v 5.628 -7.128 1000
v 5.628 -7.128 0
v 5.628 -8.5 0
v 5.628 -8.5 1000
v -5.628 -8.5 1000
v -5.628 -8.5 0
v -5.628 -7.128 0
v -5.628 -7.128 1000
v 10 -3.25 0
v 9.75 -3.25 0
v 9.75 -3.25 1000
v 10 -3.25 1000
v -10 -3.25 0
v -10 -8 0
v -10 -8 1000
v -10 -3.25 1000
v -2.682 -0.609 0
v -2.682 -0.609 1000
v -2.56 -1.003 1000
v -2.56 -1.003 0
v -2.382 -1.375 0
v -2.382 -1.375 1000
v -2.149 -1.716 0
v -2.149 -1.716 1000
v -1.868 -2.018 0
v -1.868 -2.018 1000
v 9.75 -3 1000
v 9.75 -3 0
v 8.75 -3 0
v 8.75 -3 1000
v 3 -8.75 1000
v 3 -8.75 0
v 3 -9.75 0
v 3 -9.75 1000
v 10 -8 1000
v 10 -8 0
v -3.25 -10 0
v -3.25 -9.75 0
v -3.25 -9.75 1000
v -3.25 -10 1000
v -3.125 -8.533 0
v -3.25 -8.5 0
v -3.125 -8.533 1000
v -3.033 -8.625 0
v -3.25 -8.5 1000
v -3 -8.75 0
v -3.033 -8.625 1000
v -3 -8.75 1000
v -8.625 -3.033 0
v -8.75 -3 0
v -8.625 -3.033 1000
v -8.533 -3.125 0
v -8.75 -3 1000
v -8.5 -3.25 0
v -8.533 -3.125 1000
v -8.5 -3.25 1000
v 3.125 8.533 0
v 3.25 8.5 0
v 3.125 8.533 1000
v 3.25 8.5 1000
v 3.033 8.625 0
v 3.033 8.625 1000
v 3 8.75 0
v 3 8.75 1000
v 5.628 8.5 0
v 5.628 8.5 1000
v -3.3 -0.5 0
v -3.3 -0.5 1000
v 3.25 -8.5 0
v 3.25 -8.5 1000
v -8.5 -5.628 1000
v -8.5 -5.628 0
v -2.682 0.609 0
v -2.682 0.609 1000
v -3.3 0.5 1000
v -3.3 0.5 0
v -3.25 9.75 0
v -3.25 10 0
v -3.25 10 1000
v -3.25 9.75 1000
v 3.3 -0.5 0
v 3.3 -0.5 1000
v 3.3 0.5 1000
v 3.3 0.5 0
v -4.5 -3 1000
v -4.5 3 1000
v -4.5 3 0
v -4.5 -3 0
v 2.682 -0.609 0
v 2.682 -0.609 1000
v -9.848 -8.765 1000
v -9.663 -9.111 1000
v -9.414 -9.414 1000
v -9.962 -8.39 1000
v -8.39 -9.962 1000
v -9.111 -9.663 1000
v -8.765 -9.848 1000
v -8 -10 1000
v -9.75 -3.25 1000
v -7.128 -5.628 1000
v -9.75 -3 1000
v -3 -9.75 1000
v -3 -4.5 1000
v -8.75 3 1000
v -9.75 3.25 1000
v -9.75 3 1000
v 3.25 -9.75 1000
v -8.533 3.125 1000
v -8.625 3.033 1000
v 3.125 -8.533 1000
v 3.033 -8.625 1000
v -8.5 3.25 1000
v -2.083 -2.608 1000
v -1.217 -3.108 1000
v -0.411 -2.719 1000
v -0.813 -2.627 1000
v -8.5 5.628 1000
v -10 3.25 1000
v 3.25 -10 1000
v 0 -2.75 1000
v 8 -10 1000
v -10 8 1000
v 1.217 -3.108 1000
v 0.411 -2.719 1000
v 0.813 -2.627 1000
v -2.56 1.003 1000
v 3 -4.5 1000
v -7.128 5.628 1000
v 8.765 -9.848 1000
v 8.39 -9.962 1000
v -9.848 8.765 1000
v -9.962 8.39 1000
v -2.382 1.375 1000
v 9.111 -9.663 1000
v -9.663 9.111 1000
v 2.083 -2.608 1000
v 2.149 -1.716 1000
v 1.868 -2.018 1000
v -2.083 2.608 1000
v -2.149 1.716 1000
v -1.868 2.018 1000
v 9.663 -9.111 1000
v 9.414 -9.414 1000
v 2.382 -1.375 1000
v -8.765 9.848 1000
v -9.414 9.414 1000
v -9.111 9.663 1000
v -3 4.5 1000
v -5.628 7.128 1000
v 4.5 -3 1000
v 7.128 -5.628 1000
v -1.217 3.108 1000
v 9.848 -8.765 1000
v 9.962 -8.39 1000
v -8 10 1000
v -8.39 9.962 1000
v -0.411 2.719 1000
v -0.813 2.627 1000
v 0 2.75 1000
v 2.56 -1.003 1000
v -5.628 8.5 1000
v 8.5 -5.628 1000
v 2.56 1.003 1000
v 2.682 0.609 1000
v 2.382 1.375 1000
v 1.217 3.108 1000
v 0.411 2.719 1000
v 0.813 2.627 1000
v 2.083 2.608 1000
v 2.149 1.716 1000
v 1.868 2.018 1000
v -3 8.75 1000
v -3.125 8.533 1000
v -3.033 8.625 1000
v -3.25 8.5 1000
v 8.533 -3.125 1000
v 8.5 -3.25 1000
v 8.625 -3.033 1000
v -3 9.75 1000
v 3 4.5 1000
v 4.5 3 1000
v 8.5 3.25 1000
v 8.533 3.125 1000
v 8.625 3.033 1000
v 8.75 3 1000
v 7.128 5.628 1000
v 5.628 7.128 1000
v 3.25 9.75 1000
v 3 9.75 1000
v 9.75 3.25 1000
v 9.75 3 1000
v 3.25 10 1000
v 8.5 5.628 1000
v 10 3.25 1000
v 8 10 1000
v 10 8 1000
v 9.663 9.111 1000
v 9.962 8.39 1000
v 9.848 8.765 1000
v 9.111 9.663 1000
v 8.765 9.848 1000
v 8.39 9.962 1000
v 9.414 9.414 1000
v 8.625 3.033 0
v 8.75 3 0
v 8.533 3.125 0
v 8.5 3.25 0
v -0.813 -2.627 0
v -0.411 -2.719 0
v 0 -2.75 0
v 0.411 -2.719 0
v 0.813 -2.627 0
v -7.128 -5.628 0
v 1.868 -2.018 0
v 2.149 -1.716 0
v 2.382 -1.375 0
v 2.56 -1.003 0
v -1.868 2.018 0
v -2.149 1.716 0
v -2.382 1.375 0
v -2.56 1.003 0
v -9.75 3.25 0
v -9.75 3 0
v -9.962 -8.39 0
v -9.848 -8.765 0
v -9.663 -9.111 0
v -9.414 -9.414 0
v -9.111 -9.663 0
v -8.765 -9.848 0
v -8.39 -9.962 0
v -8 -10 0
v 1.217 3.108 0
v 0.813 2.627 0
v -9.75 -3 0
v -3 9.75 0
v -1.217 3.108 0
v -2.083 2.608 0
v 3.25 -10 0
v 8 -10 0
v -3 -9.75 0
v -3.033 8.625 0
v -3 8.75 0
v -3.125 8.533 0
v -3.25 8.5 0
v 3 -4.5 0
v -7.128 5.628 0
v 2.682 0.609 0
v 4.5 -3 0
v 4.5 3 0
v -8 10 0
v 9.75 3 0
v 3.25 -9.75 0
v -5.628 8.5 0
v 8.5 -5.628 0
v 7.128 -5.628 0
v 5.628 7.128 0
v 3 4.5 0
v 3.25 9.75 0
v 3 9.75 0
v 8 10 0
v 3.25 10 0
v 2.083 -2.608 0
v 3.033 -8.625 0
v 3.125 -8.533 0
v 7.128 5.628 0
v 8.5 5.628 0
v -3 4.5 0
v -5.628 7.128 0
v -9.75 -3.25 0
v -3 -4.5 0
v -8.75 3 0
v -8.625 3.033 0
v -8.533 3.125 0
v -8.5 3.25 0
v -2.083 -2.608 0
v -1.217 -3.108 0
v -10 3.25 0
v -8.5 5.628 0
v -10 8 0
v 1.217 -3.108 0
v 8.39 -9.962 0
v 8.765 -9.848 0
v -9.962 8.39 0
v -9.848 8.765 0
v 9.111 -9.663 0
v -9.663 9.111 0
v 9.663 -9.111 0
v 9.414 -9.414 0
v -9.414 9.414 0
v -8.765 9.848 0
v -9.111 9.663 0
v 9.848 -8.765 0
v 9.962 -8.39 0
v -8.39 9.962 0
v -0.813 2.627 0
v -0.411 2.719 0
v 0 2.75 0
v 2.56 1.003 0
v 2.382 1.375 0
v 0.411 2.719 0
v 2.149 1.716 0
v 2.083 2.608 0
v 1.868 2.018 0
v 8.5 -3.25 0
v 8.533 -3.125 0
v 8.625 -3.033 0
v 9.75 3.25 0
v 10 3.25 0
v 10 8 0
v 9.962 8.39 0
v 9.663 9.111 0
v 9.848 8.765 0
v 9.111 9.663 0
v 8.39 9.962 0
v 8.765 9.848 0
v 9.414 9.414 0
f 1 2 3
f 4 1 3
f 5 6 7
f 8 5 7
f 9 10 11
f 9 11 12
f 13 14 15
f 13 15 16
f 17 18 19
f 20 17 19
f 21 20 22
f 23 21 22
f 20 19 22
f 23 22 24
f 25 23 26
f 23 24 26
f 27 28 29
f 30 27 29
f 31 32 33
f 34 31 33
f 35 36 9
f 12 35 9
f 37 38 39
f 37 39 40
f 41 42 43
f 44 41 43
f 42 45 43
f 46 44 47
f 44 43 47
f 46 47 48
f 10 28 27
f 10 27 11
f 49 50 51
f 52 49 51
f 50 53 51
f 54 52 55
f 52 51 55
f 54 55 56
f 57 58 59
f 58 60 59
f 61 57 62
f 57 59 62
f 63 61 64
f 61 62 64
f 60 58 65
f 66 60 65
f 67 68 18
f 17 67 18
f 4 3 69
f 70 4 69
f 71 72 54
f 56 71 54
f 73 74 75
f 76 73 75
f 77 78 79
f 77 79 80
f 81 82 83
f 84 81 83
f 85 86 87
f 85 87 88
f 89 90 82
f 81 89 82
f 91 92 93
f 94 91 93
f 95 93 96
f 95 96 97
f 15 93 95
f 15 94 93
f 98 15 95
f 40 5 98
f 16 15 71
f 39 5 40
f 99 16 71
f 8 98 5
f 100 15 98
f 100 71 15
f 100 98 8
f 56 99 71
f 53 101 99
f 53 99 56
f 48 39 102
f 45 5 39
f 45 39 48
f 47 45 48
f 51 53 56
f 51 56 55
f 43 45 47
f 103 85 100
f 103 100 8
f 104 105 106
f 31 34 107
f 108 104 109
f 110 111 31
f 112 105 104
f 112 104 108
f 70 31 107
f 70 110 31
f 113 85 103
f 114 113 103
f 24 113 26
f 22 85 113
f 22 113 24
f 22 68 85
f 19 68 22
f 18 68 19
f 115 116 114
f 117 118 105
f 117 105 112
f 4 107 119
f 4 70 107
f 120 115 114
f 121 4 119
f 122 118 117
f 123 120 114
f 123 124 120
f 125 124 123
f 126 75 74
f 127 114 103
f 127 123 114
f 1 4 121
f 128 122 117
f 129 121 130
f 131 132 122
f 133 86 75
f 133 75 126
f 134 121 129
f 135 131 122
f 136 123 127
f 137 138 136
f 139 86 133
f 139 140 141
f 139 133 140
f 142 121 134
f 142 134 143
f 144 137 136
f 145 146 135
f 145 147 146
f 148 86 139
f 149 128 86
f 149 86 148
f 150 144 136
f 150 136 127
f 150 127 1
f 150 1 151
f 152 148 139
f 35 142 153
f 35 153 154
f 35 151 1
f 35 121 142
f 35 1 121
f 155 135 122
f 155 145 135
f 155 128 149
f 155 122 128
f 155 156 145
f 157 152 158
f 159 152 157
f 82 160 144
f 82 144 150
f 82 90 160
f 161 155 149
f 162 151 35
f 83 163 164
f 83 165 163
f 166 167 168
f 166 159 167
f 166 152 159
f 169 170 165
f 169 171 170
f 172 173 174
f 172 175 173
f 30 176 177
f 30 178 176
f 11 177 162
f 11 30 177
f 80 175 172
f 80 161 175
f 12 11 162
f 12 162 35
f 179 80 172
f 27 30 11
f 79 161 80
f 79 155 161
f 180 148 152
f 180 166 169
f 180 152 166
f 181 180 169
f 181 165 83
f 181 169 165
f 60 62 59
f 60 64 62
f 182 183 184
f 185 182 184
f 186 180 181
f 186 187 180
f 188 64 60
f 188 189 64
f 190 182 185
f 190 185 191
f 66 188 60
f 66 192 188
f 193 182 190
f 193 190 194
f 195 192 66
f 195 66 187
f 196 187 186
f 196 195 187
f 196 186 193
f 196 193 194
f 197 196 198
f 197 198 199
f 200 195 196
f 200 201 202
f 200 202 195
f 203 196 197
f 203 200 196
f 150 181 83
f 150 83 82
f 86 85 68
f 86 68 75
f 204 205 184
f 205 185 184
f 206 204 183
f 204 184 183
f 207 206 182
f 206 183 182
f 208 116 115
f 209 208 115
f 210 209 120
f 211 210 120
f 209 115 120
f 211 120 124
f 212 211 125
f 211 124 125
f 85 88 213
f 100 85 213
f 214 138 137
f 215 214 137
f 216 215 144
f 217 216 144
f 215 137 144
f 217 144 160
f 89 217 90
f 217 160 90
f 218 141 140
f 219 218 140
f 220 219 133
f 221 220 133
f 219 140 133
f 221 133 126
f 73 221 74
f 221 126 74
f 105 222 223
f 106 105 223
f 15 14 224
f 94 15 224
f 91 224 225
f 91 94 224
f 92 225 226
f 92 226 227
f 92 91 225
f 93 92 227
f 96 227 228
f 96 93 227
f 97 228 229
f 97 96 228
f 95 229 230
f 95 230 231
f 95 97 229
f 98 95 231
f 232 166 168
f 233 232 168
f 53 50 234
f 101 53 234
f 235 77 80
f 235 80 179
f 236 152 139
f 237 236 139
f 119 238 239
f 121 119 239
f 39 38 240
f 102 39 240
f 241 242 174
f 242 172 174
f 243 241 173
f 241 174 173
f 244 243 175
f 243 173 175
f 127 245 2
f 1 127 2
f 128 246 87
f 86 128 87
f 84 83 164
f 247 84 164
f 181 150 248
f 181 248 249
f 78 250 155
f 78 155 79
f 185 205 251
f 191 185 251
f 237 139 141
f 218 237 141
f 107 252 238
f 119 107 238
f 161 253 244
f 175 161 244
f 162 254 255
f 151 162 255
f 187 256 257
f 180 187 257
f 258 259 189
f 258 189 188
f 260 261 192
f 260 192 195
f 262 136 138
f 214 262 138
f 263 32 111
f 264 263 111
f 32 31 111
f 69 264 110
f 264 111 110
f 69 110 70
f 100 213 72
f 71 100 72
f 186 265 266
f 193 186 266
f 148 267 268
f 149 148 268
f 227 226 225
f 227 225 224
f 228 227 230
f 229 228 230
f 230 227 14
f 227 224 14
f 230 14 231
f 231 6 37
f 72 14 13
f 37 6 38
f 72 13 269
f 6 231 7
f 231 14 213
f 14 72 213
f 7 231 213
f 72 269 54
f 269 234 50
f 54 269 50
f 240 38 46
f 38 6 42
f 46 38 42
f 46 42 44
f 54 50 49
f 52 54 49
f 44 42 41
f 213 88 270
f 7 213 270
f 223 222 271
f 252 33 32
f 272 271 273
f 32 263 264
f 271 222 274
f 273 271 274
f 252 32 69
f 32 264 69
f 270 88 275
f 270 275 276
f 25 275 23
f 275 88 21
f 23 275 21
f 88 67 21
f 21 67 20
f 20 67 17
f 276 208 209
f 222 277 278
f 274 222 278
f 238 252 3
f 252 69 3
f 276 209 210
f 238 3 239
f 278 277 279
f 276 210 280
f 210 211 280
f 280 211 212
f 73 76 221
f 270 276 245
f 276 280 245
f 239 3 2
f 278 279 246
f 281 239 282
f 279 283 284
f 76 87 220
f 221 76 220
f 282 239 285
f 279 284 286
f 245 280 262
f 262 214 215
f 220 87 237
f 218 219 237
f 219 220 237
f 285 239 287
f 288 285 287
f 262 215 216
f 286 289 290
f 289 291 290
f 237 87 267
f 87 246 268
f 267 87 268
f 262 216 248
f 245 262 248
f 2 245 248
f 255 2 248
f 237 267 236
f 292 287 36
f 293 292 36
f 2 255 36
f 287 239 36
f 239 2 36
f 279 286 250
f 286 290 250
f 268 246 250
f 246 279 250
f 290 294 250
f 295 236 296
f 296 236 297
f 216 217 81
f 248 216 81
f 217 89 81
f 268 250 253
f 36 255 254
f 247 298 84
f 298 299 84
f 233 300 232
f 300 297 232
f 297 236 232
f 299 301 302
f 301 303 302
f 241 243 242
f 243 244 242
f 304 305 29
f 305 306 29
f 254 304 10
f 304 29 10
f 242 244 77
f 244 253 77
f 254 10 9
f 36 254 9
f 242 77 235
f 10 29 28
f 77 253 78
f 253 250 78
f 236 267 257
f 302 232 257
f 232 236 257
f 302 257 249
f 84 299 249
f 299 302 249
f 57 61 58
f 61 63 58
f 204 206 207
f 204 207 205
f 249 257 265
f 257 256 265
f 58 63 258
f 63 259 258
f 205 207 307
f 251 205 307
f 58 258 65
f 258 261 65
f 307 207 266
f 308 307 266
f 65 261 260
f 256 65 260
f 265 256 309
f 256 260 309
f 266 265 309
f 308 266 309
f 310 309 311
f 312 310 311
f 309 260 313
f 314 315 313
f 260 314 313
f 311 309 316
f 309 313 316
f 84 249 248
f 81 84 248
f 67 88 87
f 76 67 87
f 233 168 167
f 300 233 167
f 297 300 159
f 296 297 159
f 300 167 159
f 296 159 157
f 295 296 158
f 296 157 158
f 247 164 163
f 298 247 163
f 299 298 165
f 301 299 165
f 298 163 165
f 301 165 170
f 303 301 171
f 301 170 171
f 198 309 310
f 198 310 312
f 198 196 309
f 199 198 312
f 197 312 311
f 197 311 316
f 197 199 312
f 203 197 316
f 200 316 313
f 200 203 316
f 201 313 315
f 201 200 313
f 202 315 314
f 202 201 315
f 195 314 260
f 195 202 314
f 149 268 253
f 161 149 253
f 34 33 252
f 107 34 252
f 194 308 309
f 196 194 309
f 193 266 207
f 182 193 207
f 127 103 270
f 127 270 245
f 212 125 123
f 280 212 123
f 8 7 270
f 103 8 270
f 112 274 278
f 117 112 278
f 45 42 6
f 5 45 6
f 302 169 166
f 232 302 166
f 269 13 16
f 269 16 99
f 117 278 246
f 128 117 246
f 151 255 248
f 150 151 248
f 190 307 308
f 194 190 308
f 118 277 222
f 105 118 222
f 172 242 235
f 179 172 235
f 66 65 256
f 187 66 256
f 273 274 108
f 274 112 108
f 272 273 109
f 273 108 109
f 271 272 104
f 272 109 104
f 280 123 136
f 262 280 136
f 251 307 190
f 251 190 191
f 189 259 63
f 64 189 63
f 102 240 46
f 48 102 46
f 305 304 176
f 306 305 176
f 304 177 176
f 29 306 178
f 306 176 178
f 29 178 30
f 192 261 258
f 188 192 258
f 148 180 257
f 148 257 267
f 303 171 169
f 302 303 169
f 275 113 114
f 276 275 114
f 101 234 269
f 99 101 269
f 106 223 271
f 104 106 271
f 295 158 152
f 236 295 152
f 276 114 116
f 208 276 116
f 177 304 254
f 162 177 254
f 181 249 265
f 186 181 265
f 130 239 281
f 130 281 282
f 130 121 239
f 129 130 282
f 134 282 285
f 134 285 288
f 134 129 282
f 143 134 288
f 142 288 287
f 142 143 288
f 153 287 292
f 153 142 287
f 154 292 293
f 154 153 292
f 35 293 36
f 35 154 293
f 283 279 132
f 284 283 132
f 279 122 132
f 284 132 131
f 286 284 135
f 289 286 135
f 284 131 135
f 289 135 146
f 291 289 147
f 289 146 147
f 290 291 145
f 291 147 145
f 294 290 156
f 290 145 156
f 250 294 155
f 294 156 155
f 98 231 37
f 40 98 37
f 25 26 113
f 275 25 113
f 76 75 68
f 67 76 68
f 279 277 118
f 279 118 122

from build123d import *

# Parameters (mm, degrees)
F0_W     = 20
F0_H     = 20
F1_DEPTH = 1000
F2_R     = 2
F4_DEPTH = 1000
F6_DEPTH = 1000
F7_W     = 0.25
F7_H     = 0.25
F8_DEPTH = 1000
F9_R     = 0.25


with BuildPart() as f1:
    # F0 (on Top) → F1 (new body)
    with BuildSketch(Plane.XY):
        Rectangle(F0_W, F0_H)
    extrude(amount=F1_DEPTH)

    # F2
    f2_edges = [f1.edges().sort_by_distance(p)[0] for p in [
        (10, 10, 500),
        (-10, 10, 500),
        (-10, -10, 500),
        (10, -10, 500),
    ]]
    fillet(f2_edges, radius=F2_R)

    # F3 (on face) → F4 (cut, through all)
    with BuildSketch(Plane(origin=(0, 0, 0), x_dir=(1, 0, 0), z_dir=(0, 0, -1))):
        Polygon((3, 10), (-3, 10), (-3, 8.5), (-5.627585, 8.5), (-5.627585, 7.127585), (-3, 4.5), (0, 4.5), (3, 4.5), (5.627585, 7.127585), (5.627585, 8.5), (3, 8.5), align=None)
        Polygon((10, -3), (10, 3), (8.5, 3), (8.5, 5.627585), (7.127585, 5.627585), (4.5, 3), (4.5, 0), (4.5, -3), (7.127585, -5.627585), (8.5, -5.627585), (8.5, -3), align=None)
        Polygon((-3, -8.5), (-3, -10), (3, -10), (3, -8.5), (5.627585, -8.5), (5.627585, -7.127585), (3, -4.5), (0, -4.5), (-3, -4.5), (-5.627585, -7.127585), (-5.627585, -8.5), align=None)
        Polygon((-8.5, 3), (-10, 3), (-10, -3), (-8.5, -3), (-8.5, -5.627585), (-7.127585, -5.627585), (-4.5, -3), (-4.5, 0), (-4.5, 3), (-7.127585, 5.627585), (-8.5, 5.627585), align=None)
    extrude(amount=-F4_DEPTH, mode=Mode.SUBTRACT)

    # F5 (on face) → F6 (cut, through all)
    with BuildSketch(Plane.XY.offset(1000)):
        with BuildLine():
            Line((-3.3, -0.5), (-2.681715, -0.60902))
            ThreePointArc((-2.681715, -0.60902), (-2.38157, -1.375), (-1.868285, -2.017923))
            Line((-1.868285, -2.017923), (-2.083013, -2.607884))
            Line((-2.083013, -2.607884), (-1.65, -2.857884))
            Line((-1.65, -2.857884), (-1.216987, -3.107884))
            Line((-1.216987, -3.107884), (-0.81343, -2.626943))
            ThreePointArc((-0.81343, -2.626943), (0, -2.75), (0.81343, -2.626943))
            Line((0.81343, -2.626943), (1.216987, -3.107884))
            Line((1.216987, -3.107884), (1.65, -2.857884))
            Line((1.65, -2.857884), (2.083013, -2.607884))
            Line((2.083013, -2.607884), (1.868285, -2.017923))
            ThreePointArc((1.868285, -2.017923), (2.38157, -1.375), (2.681715, -0.60902))
            Line((2.681715, -0.60902), (3.3, -0.5))
            Line((3.3, -0.5), (3.3, 0))
            Line((3.3, 0), (3.3, 0.5))
            Line((3.3, 0.5), (2.681715, 0.60902))
            ThreePointArc((2.681715, 0.60902), (2.38157, 1.375), (1.868285, 2.017923))
            Line((1.868285, 2.017923), (2.083013, 2.607884))
            Line((2.083013, 2.607884), (1.65, 2.857884))
            Line((1.65, 2.857884), (1.216987, 3.107884))
            Line((1.216987, 3.107884), (0.81343, 2.626943))
            ThreePointArc((0.81343, 2.626943), (0, 2.75), (-0.81343, 2.626943))
            Line((-0.81343, 2.626943), (-1.216987, 3.107884))
            Line((-1.216987, 3.107884), (-1.65, 2.857884))
            Line((-1.65, 2.857884), (-2.083013, 2.607884))
            Line((-2.083013, 2.607884), (-1.868285, 2.017923))
            ThreePointArc((-1.868285, 2.017923), (-2.38157, 1.375), (-2.681715, 0.60902))
            Line((-2.681715, 0.60902), (-3.3, 0.5))
            Line((-3.3, 0.5), (-3.3, 0))
            Line((-3.3, 0), (-3.3, -0.5))
        make_face()
    extrude(amount=-F6_DEPTH, mode=Mode.SUBTRACT)

    # F7 (on face) → F8 (cut, through all)
    with BuildSketch(Plane(origin=(0, 0, 0), x_dir=(1, 0, 0), z_dir=(0, 0, -1))):
        with Locations((-9.875, 3.125)):
            Rectangle(F7_W, F7_H)
        with Locations((-3.125, 9.875)):
            Rectangle(F7_W, F7_H)
        with Locations((3.125, 9.875)):
            Rectangle(F7_W, F7_H)
        with Locations((9.875, 3.125)):
            Rectangle(F7_W, F7_H)
        with Locations((-9.875, -3.125)):
            Rectangle(F7_W, F7_H)
        with Locations((9.875, -3.125)):
            Rectangle(F7_W, F7_H)
        with Locations((-3.125, -9.875)):
            Rectangle(F7_W, F7_H)
        with Locations((3.125, -9.875)):
            Rectangle(F7_W, F7_H)
    extrude(amount=-F8_DEPTH, mode=Mode.SUBTRACT)

    # F9
    f9_edges = [f1.edges().sort_by_distance(p)[0] for p in [
        (-8.5, 3, 500),
        (-8.5, -3, 500),
        (-3, -8.5, 500),
        (3, -8.5, 500),
        (8.5, -3, 500),
        (-3, 8.5, 500),
        (3, 8.5, 500),
        (8.5, 3, 500),
    ]]
    fillet(f9_edges, radius=F9_R)


solid = f1.part
